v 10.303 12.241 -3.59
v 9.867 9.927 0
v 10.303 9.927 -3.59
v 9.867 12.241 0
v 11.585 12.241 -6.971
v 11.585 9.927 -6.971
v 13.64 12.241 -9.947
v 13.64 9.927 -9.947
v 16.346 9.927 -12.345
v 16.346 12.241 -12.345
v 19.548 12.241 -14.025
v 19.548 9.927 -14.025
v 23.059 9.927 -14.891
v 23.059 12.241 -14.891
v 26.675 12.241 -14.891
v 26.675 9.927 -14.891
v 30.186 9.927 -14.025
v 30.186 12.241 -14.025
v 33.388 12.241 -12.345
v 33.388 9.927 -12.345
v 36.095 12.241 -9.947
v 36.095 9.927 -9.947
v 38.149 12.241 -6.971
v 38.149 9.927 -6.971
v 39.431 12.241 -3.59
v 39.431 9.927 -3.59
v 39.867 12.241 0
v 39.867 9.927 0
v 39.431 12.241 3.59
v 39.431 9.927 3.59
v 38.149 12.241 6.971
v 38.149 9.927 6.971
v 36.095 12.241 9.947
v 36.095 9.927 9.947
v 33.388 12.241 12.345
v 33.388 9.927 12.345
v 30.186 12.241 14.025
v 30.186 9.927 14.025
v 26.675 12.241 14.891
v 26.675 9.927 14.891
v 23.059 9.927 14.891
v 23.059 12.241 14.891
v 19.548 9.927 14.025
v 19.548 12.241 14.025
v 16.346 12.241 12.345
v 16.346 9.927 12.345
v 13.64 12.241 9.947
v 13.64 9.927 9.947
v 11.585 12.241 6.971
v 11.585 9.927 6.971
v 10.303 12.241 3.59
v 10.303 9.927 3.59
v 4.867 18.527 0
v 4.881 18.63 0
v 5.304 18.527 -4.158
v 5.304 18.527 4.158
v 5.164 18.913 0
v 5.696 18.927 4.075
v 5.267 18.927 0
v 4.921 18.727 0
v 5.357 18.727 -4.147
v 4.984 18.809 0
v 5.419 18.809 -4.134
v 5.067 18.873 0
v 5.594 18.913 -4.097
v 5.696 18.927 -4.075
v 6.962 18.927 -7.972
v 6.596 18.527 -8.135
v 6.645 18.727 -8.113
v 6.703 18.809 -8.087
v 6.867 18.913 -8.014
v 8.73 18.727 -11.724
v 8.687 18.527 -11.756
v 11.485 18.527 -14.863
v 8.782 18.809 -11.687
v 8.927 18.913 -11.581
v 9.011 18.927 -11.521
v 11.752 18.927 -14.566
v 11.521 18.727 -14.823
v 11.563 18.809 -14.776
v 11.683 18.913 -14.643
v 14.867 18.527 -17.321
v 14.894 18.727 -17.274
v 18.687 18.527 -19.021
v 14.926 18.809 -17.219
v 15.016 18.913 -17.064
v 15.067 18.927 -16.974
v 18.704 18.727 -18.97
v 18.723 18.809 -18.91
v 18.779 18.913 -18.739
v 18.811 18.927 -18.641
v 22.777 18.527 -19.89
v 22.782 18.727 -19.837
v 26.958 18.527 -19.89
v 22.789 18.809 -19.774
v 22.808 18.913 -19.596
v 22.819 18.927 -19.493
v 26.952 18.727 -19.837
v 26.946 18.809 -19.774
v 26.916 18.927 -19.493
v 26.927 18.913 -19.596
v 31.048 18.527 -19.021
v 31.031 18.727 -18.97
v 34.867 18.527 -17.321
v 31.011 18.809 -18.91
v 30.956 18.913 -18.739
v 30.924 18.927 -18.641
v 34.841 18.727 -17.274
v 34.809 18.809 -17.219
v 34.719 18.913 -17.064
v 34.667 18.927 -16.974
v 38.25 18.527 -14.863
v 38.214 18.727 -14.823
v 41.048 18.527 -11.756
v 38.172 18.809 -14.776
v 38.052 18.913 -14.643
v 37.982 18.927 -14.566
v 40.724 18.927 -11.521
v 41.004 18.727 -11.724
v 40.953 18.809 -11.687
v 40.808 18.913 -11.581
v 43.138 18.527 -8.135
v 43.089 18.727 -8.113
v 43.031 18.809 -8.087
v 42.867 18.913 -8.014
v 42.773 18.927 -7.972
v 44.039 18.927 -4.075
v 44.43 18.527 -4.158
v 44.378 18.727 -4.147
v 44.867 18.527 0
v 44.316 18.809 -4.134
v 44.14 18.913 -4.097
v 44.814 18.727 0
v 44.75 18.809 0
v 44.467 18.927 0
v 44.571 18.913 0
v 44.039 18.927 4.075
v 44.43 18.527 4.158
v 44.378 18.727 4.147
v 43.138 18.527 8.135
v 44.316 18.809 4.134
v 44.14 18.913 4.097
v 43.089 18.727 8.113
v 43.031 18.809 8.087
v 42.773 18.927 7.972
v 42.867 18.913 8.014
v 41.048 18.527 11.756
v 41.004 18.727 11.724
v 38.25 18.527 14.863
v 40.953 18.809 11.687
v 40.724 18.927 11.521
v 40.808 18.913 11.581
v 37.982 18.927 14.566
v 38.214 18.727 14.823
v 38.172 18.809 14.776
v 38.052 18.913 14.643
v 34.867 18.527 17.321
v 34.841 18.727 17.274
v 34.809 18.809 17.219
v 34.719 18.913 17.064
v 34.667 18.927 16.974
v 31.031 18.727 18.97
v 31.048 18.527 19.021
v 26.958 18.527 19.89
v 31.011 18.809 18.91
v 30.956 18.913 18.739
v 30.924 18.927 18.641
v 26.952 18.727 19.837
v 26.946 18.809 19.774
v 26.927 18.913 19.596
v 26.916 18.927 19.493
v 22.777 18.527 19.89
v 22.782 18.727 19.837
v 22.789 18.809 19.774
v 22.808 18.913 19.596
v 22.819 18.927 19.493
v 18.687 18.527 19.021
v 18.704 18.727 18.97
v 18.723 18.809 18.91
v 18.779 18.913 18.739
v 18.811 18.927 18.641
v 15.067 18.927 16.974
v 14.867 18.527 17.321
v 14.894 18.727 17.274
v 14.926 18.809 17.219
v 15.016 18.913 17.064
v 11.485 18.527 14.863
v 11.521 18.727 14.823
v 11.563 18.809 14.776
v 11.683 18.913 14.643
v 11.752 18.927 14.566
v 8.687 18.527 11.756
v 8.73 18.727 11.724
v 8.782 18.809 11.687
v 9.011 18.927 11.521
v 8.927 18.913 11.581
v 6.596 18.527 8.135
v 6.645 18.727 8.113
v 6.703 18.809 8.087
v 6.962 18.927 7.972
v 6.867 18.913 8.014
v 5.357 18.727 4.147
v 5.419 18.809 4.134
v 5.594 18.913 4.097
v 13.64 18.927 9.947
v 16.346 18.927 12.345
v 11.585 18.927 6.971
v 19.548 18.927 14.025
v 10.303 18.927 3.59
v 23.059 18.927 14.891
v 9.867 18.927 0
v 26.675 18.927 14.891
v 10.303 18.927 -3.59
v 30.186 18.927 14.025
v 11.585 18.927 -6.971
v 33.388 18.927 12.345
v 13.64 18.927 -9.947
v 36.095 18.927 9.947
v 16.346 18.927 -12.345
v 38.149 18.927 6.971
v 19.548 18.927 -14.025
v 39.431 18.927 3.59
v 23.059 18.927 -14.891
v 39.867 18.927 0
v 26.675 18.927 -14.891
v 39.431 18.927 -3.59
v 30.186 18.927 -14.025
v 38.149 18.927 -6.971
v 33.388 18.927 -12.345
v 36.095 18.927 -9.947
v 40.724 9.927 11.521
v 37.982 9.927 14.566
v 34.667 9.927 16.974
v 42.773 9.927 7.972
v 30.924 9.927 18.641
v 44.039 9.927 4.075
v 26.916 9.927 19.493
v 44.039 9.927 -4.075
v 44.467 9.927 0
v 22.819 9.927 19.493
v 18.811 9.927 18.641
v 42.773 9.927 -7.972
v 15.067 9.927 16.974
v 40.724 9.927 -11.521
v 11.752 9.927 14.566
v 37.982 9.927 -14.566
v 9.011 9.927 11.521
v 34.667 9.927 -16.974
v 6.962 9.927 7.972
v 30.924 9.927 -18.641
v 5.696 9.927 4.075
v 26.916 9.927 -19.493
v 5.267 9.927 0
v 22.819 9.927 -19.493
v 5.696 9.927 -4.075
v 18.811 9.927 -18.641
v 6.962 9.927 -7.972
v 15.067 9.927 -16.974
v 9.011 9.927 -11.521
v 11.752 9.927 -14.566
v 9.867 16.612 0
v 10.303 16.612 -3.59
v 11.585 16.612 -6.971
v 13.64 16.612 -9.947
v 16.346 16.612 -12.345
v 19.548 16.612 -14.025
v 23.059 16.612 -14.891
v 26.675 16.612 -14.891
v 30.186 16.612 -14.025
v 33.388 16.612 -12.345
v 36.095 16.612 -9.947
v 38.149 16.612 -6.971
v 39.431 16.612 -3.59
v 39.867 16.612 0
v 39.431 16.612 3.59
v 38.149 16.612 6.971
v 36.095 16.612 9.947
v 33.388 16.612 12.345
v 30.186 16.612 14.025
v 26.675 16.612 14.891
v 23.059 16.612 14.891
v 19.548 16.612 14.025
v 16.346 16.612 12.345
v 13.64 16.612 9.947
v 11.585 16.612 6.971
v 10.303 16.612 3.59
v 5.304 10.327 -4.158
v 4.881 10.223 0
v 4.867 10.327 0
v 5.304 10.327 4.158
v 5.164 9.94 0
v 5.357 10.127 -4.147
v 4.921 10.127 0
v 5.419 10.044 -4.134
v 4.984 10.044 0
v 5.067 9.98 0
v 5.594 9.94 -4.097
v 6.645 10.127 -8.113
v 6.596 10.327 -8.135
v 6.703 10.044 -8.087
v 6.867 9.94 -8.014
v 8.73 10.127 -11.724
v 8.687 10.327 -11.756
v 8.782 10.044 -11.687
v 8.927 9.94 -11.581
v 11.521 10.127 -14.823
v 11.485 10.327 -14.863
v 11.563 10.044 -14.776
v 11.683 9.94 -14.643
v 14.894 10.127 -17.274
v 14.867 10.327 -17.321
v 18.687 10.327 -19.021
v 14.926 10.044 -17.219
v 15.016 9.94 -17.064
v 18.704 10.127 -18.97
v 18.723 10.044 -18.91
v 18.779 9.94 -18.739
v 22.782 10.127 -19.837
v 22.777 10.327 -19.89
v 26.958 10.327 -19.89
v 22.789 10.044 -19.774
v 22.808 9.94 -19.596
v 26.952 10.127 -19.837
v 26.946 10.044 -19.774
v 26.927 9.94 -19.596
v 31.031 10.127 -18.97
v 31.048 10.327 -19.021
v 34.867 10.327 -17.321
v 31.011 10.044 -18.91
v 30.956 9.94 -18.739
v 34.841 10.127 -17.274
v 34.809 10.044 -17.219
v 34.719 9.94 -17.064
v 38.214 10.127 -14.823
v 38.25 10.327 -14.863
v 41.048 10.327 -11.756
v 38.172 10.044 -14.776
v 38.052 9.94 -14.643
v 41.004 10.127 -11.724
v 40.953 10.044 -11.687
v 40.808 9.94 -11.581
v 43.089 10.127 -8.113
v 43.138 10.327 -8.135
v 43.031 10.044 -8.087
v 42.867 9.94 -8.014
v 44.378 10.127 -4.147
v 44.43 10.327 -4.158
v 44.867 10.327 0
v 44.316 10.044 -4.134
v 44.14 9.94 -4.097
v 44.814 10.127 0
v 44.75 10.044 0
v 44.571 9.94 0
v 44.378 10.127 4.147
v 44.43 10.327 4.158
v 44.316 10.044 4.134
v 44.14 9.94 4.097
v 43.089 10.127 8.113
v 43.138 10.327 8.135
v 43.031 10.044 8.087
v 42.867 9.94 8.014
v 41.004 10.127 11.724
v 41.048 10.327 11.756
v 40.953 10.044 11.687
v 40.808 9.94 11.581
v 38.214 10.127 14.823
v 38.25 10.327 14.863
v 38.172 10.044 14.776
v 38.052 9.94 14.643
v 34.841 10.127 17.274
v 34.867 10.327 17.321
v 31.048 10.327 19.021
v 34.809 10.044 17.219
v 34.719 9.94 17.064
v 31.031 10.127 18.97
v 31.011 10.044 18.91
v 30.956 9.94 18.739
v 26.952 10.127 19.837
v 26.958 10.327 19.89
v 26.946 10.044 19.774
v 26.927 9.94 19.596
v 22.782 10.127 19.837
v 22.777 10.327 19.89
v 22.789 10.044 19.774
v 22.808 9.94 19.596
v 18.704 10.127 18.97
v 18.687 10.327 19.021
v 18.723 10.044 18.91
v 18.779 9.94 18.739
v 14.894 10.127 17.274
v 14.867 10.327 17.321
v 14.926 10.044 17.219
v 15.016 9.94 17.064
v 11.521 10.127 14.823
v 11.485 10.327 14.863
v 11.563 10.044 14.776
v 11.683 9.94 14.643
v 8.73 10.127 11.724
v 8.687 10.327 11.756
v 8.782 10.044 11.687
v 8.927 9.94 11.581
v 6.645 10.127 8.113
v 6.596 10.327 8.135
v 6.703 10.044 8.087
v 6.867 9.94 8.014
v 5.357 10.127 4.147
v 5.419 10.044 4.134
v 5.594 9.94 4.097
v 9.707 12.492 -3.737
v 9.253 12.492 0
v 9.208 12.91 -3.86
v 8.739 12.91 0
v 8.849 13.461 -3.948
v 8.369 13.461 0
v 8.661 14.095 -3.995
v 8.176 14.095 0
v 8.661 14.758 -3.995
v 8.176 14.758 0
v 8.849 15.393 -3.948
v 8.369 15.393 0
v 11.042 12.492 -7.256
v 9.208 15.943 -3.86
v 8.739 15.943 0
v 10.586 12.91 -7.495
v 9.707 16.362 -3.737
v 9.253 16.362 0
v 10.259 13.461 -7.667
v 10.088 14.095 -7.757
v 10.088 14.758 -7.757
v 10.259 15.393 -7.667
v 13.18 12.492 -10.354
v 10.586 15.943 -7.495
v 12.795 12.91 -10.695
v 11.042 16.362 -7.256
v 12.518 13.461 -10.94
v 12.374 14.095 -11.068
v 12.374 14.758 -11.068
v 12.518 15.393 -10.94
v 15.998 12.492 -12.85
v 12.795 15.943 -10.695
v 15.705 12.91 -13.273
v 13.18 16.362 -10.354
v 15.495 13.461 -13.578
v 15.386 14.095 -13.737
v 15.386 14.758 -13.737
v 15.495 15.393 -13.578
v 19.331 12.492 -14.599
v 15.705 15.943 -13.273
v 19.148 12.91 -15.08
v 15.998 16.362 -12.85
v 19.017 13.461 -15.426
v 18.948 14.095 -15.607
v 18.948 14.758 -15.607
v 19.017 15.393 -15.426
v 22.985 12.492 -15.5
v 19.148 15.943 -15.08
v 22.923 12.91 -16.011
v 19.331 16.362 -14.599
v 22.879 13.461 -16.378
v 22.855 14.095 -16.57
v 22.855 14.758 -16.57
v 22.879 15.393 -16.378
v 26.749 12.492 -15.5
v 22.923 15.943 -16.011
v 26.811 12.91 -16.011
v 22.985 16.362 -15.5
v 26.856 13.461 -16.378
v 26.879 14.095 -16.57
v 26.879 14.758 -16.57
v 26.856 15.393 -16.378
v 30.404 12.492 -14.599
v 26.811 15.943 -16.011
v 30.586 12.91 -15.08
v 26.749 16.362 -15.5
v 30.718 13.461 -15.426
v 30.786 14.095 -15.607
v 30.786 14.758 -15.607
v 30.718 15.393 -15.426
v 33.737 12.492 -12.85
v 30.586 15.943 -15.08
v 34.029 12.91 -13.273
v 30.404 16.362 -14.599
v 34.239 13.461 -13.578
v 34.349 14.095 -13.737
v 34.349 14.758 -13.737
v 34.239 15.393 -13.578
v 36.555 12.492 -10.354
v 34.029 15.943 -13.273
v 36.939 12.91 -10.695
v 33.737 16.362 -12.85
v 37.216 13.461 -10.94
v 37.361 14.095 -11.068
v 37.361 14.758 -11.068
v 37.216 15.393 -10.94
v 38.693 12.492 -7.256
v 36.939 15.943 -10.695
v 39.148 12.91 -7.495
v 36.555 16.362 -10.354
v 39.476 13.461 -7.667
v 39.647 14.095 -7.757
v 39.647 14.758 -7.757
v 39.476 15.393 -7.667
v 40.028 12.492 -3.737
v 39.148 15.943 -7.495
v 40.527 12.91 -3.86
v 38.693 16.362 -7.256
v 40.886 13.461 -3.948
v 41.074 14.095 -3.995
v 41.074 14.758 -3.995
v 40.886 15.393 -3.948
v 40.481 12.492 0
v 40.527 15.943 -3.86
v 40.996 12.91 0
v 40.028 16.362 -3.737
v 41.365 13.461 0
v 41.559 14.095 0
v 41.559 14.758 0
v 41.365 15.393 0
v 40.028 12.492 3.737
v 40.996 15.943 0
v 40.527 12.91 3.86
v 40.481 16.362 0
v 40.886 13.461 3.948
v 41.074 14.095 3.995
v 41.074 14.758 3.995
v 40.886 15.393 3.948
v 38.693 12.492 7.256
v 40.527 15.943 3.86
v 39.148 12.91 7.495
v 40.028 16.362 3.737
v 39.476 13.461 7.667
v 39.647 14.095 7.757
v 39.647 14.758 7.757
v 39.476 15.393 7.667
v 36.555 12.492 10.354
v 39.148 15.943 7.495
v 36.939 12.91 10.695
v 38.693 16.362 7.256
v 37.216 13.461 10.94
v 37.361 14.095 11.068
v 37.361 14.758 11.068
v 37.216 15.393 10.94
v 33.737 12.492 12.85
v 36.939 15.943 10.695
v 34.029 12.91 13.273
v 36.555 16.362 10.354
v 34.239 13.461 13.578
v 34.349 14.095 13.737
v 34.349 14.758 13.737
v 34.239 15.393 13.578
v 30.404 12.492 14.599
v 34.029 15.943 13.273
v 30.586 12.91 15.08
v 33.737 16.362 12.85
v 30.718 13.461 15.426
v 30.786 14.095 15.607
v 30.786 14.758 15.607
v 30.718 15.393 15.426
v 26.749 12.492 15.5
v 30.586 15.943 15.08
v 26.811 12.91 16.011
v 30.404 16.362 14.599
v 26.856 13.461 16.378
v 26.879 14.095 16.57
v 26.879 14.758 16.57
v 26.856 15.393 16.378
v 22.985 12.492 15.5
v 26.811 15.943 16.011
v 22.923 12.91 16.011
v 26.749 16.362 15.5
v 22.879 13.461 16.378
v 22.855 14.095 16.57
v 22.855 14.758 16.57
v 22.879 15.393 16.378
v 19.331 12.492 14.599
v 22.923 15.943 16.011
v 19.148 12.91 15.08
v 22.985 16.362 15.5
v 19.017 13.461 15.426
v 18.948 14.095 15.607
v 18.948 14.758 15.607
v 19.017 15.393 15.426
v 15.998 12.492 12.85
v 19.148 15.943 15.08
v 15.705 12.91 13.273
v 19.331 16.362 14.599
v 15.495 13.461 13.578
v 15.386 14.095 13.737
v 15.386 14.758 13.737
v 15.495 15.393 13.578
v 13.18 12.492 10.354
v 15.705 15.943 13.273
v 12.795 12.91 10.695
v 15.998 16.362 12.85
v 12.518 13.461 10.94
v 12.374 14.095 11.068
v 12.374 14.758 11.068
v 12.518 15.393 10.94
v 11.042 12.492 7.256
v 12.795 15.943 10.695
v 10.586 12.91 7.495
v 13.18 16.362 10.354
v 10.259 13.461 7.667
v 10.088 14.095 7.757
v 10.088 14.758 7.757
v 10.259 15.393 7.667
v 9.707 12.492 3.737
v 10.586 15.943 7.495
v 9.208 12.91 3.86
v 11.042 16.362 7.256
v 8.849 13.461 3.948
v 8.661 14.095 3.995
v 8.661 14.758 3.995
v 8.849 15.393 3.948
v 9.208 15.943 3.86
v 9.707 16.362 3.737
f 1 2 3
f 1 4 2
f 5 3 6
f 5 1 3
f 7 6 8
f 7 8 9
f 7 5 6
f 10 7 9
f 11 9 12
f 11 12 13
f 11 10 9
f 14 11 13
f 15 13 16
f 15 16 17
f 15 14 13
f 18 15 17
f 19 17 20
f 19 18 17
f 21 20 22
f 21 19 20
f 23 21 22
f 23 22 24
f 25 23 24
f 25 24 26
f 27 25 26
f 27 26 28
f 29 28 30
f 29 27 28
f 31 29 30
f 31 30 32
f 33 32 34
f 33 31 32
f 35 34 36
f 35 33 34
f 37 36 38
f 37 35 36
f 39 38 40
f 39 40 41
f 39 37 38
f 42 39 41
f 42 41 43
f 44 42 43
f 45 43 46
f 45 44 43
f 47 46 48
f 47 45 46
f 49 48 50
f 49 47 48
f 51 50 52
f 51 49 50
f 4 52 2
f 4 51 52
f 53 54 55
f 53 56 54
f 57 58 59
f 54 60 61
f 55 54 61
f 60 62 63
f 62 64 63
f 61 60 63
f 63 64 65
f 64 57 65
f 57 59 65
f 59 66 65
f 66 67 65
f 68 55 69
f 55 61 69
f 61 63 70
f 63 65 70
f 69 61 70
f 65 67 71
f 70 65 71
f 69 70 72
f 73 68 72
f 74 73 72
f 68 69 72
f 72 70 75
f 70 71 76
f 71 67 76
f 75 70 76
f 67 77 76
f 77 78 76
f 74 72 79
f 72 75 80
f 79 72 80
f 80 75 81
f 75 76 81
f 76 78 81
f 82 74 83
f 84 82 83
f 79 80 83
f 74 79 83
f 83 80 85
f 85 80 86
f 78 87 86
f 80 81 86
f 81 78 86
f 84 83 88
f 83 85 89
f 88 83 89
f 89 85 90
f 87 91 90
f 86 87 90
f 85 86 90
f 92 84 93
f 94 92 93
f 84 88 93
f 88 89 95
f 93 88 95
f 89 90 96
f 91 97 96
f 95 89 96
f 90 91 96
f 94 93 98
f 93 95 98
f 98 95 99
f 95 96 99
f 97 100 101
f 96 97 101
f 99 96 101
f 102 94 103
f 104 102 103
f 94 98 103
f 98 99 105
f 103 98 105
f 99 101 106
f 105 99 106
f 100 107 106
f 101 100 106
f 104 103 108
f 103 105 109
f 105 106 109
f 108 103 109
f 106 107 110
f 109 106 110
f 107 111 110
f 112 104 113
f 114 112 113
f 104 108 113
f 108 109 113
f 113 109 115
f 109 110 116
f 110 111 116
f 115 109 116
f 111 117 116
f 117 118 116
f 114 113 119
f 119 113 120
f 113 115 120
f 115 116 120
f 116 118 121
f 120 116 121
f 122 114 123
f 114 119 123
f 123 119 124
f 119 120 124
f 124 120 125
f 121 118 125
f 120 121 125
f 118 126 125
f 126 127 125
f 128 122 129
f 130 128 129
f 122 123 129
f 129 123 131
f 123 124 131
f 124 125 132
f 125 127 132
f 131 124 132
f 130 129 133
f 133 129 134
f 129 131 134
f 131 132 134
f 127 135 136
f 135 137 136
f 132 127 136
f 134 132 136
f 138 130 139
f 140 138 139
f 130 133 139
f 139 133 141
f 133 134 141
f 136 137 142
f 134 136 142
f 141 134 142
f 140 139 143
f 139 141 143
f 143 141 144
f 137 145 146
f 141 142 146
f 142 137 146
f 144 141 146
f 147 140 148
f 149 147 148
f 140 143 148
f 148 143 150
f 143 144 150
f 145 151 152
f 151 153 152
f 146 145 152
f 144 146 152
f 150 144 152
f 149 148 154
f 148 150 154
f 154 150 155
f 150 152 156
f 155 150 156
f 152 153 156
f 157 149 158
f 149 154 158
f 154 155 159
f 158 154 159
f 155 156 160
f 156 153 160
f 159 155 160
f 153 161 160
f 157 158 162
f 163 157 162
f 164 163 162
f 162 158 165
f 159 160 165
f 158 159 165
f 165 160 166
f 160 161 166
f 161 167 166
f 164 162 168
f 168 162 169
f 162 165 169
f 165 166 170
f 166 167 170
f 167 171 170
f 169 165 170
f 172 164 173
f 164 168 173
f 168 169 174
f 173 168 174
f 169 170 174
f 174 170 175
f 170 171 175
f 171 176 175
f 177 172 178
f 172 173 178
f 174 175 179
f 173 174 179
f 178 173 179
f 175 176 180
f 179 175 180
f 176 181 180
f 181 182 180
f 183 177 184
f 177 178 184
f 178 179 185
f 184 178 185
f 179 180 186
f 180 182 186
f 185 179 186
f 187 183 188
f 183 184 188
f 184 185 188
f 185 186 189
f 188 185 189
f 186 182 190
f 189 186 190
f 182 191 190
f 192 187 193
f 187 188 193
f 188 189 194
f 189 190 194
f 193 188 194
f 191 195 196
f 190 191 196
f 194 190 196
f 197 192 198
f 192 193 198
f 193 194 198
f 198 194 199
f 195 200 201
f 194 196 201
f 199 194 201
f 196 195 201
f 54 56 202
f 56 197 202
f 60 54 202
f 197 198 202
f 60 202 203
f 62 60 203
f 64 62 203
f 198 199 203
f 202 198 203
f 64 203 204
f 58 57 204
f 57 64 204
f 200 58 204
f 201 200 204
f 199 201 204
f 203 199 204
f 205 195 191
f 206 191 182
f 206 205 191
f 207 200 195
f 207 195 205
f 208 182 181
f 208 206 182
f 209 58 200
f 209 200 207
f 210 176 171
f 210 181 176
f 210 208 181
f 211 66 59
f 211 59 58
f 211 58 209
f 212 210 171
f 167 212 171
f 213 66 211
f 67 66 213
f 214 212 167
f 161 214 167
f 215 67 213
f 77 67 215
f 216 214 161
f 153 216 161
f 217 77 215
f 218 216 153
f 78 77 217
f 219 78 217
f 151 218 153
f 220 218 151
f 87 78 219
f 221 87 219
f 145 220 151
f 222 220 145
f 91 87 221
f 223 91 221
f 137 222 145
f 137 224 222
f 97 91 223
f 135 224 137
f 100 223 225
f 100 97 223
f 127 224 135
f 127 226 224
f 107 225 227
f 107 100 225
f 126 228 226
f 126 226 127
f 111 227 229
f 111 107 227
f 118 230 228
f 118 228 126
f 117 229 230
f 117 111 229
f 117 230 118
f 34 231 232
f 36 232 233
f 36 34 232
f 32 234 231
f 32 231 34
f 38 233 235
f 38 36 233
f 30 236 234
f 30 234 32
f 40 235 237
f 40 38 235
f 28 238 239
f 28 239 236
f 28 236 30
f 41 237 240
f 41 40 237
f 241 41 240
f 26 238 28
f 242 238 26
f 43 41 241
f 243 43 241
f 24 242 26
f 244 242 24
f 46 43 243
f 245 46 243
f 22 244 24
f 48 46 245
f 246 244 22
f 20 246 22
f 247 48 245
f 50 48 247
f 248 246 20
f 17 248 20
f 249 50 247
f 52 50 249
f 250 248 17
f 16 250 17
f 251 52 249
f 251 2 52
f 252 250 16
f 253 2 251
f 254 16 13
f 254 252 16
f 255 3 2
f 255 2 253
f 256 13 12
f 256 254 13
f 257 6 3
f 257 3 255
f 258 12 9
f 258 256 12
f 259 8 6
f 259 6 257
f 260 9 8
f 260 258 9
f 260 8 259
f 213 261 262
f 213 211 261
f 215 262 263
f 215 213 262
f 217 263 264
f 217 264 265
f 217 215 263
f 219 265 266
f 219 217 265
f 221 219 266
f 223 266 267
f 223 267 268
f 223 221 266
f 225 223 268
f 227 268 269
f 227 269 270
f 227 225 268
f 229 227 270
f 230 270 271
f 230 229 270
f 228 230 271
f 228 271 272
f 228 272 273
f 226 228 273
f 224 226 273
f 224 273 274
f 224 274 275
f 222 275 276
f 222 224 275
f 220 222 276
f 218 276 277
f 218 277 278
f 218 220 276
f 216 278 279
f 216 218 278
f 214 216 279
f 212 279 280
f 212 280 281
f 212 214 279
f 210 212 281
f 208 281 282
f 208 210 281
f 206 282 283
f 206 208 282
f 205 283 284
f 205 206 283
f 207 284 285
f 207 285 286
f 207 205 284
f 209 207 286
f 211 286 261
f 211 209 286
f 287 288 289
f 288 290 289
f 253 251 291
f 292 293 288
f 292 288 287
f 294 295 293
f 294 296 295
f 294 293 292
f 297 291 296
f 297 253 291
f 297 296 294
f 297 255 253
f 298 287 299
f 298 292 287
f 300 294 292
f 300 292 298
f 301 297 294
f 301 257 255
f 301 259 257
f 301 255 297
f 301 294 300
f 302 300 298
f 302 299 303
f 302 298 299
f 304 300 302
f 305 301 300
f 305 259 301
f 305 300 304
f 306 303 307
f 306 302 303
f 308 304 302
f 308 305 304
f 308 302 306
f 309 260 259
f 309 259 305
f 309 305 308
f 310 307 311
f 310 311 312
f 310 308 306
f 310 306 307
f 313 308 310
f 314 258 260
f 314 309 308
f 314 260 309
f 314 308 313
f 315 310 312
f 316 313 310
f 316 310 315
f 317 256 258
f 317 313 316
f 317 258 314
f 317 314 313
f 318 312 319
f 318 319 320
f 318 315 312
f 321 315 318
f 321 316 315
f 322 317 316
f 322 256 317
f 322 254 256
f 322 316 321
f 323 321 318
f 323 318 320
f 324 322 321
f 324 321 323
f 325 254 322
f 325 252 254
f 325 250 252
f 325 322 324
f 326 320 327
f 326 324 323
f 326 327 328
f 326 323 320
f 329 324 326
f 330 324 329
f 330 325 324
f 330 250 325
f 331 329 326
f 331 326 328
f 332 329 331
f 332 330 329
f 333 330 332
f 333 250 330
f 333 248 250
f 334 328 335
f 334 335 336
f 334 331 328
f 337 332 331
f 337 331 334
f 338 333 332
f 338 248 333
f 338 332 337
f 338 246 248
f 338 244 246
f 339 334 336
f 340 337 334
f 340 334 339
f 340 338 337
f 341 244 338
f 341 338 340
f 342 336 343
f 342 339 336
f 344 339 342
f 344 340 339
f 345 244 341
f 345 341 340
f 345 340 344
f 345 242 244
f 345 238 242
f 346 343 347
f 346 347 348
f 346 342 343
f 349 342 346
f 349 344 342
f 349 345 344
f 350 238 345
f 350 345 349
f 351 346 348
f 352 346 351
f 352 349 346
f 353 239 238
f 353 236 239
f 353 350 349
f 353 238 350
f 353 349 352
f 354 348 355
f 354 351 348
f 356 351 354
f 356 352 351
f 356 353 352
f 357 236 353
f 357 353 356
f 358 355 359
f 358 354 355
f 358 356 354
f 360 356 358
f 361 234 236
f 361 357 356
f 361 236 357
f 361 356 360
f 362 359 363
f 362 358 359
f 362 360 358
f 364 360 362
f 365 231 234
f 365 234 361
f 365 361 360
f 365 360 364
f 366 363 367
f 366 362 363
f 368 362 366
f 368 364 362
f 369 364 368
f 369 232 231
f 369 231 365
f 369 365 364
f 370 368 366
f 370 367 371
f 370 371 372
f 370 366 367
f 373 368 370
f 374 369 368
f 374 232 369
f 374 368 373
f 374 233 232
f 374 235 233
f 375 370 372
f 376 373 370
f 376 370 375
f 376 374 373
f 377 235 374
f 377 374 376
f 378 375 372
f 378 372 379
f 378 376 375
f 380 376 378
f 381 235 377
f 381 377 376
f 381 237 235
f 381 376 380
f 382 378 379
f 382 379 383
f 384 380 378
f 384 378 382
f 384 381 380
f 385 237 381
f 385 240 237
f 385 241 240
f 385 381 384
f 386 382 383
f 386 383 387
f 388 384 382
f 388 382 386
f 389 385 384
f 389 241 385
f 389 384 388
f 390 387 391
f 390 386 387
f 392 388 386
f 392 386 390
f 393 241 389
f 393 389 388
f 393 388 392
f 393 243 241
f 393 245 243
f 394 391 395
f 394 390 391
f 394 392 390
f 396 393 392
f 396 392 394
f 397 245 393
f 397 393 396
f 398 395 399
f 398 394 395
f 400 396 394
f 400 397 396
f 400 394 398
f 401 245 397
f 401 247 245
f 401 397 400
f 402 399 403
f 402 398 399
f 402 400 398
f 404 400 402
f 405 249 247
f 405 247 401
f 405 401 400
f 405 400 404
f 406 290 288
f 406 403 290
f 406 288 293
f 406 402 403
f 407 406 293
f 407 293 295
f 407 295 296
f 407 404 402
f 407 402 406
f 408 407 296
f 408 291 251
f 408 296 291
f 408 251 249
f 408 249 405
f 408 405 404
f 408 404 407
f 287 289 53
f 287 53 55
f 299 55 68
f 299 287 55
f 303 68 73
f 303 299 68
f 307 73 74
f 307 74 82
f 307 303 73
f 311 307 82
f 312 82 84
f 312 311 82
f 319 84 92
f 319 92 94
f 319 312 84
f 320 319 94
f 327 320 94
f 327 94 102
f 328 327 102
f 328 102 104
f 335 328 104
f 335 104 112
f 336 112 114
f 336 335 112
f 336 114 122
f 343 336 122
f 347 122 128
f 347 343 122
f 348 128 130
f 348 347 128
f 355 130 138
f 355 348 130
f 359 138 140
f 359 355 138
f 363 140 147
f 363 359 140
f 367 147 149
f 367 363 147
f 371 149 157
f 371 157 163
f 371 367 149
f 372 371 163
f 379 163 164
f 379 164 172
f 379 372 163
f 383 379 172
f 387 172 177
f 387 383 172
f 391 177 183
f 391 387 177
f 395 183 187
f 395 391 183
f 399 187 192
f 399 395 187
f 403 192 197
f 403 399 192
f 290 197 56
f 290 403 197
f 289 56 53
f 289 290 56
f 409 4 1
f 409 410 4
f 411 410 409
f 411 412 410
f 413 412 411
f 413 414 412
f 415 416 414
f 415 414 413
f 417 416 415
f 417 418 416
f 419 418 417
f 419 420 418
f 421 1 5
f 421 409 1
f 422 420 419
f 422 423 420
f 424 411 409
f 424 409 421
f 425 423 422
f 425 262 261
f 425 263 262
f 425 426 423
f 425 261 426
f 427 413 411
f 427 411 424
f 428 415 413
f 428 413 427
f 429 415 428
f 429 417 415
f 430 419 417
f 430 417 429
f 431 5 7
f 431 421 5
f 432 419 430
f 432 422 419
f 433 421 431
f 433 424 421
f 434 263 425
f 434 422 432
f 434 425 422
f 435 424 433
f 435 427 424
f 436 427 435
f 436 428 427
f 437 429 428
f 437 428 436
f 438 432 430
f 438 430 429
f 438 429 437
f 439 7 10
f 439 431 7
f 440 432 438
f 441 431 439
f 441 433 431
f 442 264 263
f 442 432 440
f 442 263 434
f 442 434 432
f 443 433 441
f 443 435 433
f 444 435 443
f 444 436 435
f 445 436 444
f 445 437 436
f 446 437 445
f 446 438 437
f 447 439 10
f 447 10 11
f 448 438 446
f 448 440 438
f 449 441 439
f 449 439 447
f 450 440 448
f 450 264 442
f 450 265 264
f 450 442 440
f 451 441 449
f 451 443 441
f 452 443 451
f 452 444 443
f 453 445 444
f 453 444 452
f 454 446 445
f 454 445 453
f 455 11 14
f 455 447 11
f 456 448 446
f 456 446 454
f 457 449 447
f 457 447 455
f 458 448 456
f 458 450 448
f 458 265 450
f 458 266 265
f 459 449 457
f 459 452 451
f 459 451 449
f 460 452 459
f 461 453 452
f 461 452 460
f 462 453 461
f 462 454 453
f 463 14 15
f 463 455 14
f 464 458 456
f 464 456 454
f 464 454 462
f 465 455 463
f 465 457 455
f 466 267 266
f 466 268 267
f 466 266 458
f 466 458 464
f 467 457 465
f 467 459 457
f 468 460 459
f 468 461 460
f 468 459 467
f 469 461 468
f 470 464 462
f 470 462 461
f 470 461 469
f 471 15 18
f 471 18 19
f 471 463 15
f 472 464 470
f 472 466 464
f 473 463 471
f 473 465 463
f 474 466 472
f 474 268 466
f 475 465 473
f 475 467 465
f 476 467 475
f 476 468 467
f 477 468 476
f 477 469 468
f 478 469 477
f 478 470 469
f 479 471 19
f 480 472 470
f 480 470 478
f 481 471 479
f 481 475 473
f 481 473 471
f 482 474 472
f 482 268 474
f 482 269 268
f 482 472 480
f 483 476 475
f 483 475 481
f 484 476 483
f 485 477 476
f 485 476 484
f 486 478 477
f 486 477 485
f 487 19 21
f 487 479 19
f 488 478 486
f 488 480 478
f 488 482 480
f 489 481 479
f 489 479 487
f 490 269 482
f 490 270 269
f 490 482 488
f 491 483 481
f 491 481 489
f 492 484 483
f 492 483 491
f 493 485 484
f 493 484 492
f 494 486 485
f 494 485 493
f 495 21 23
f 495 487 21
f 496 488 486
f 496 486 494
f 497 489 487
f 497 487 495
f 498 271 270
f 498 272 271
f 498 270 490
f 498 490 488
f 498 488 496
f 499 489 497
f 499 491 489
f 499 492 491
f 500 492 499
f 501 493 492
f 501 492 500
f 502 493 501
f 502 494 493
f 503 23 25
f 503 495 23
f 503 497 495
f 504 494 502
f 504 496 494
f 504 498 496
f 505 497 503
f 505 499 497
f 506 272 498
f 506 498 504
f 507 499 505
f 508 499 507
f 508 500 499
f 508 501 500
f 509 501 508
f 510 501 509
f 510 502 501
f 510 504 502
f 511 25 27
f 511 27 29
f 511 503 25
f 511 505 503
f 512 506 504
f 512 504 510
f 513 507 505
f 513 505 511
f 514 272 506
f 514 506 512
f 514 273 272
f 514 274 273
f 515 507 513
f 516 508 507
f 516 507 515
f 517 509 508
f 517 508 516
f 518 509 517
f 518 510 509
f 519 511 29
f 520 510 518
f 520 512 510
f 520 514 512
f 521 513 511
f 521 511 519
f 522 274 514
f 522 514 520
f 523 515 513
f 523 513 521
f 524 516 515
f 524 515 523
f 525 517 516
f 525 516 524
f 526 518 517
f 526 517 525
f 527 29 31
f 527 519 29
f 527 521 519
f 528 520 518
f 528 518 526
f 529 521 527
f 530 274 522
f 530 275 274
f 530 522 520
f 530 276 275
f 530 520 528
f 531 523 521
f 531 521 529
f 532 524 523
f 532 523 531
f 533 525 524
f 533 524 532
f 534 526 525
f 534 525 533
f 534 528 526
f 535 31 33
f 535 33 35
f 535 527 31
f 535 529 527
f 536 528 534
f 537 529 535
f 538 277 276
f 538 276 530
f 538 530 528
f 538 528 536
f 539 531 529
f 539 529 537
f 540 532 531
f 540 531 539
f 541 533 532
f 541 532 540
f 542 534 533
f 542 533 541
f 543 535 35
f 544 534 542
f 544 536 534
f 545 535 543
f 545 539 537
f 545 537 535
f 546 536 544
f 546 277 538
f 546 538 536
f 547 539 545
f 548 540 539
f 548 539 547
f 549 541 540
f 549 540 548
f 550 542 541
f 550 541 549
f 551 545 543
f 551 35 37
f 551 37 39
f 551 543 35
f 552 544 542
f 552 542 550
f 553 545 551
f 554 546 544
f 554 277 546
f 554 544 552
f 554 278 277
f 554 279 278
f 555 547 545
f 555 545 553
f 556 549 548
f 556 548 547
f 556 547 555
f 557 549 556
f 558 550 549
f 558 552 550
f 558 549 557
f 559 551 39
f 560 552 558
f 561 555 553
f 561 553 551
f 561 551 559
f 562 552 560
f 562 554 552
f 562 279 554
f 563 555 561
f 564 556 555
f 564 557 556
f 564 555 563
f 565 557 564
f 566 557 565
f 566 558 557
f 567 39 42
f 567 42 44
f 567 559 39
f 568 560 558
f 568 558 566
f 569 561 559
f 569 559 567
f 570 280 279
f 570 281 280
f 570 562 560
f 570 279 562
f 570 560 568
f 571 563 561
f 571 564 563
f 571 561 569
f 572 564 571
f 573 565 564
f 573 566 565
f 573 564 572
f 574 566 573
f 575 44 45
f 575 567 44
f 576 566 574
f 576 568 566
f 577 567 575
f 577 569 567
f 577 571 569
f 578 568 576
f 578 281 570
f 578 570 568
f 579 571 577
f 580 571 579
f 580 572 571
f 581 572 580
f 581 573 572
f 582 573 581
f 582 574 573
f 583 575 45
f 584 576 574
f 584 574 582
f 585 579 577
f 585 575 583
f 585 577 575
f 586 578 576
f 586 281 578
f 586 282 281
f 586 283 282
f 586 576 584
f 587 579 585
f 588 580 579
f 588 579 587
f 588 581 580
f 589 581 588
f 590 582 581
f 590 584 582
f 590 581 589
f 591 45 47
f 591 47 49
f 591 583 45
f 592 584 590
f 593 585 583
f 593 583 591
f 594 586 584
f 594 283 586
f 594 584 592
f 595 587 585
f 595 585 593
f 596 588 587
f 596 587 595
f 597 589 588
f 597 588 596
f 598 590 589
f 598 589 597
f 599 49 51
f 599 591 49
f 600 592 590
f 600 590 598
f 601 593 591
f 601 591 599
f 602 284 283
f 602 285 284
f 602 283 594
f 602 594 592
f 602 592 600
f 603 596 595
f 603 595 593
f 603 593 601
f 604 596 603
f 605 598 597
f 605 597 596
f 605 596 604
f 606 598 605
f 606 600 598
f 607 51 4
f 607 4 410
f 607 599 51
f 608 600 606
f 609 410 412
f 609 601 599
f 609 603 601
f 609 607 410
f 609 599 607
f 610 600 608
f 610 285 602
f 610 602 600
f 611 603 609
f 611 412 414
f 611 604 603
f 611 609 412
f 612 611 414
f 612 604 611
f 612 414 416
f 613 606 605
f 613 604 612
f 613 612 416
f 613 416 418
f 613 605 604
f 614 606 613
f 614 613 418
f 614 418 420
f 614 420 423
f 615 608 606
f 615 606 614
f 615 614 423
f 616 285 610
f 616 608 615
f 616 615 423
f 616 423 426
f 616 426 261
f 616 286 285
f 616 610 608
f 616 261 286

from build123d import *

# Parameters (mm, degrees)
F2_R = 0.4


with BuildPart() as f1:
    # F0 (on Top) → F1 (revolve)
    with BuildSketch(Plane.XY):
        with BuildLine():
            Line((4.8672996052, 18.9265990148), (4.8672996052, 9.9265990148))
            Line((4.8672996052, 9.9265990148), (9.3672996052, 9.9265990148))
            Line((9.3672996052, 9.9265990148), (9.8672996052, 9.9265990148))
            Line((9.8672996052, 9.9265990148), (9.8672996052, 12.2409004436))
            ThreePointArc((9.8672996052, 12.2409004436), (8.1513611708, 14.4265990148), (9.8672996052, 16.612297586))
            Line((9.8672996052, 16.612297586), (9.8672996052, 18.9265990148))
            Line((9.8672996052, 18.9265990148), (4.8672996052, 18.9265990148))
        make_face()
    revolve(axis=Axis((24.8672996052, 14.4265990148, 0), (0, -1, 0)))

    # F2
    f2_edges = [f1.edges().sort_by_distance(p)[0] for p in [
        (44.8673, 18.926599, 0),
        (44.8673, 9.926599, 0),
    ]]
    fillet(f2_edges, radius=F2_R)


solid = f1.part
